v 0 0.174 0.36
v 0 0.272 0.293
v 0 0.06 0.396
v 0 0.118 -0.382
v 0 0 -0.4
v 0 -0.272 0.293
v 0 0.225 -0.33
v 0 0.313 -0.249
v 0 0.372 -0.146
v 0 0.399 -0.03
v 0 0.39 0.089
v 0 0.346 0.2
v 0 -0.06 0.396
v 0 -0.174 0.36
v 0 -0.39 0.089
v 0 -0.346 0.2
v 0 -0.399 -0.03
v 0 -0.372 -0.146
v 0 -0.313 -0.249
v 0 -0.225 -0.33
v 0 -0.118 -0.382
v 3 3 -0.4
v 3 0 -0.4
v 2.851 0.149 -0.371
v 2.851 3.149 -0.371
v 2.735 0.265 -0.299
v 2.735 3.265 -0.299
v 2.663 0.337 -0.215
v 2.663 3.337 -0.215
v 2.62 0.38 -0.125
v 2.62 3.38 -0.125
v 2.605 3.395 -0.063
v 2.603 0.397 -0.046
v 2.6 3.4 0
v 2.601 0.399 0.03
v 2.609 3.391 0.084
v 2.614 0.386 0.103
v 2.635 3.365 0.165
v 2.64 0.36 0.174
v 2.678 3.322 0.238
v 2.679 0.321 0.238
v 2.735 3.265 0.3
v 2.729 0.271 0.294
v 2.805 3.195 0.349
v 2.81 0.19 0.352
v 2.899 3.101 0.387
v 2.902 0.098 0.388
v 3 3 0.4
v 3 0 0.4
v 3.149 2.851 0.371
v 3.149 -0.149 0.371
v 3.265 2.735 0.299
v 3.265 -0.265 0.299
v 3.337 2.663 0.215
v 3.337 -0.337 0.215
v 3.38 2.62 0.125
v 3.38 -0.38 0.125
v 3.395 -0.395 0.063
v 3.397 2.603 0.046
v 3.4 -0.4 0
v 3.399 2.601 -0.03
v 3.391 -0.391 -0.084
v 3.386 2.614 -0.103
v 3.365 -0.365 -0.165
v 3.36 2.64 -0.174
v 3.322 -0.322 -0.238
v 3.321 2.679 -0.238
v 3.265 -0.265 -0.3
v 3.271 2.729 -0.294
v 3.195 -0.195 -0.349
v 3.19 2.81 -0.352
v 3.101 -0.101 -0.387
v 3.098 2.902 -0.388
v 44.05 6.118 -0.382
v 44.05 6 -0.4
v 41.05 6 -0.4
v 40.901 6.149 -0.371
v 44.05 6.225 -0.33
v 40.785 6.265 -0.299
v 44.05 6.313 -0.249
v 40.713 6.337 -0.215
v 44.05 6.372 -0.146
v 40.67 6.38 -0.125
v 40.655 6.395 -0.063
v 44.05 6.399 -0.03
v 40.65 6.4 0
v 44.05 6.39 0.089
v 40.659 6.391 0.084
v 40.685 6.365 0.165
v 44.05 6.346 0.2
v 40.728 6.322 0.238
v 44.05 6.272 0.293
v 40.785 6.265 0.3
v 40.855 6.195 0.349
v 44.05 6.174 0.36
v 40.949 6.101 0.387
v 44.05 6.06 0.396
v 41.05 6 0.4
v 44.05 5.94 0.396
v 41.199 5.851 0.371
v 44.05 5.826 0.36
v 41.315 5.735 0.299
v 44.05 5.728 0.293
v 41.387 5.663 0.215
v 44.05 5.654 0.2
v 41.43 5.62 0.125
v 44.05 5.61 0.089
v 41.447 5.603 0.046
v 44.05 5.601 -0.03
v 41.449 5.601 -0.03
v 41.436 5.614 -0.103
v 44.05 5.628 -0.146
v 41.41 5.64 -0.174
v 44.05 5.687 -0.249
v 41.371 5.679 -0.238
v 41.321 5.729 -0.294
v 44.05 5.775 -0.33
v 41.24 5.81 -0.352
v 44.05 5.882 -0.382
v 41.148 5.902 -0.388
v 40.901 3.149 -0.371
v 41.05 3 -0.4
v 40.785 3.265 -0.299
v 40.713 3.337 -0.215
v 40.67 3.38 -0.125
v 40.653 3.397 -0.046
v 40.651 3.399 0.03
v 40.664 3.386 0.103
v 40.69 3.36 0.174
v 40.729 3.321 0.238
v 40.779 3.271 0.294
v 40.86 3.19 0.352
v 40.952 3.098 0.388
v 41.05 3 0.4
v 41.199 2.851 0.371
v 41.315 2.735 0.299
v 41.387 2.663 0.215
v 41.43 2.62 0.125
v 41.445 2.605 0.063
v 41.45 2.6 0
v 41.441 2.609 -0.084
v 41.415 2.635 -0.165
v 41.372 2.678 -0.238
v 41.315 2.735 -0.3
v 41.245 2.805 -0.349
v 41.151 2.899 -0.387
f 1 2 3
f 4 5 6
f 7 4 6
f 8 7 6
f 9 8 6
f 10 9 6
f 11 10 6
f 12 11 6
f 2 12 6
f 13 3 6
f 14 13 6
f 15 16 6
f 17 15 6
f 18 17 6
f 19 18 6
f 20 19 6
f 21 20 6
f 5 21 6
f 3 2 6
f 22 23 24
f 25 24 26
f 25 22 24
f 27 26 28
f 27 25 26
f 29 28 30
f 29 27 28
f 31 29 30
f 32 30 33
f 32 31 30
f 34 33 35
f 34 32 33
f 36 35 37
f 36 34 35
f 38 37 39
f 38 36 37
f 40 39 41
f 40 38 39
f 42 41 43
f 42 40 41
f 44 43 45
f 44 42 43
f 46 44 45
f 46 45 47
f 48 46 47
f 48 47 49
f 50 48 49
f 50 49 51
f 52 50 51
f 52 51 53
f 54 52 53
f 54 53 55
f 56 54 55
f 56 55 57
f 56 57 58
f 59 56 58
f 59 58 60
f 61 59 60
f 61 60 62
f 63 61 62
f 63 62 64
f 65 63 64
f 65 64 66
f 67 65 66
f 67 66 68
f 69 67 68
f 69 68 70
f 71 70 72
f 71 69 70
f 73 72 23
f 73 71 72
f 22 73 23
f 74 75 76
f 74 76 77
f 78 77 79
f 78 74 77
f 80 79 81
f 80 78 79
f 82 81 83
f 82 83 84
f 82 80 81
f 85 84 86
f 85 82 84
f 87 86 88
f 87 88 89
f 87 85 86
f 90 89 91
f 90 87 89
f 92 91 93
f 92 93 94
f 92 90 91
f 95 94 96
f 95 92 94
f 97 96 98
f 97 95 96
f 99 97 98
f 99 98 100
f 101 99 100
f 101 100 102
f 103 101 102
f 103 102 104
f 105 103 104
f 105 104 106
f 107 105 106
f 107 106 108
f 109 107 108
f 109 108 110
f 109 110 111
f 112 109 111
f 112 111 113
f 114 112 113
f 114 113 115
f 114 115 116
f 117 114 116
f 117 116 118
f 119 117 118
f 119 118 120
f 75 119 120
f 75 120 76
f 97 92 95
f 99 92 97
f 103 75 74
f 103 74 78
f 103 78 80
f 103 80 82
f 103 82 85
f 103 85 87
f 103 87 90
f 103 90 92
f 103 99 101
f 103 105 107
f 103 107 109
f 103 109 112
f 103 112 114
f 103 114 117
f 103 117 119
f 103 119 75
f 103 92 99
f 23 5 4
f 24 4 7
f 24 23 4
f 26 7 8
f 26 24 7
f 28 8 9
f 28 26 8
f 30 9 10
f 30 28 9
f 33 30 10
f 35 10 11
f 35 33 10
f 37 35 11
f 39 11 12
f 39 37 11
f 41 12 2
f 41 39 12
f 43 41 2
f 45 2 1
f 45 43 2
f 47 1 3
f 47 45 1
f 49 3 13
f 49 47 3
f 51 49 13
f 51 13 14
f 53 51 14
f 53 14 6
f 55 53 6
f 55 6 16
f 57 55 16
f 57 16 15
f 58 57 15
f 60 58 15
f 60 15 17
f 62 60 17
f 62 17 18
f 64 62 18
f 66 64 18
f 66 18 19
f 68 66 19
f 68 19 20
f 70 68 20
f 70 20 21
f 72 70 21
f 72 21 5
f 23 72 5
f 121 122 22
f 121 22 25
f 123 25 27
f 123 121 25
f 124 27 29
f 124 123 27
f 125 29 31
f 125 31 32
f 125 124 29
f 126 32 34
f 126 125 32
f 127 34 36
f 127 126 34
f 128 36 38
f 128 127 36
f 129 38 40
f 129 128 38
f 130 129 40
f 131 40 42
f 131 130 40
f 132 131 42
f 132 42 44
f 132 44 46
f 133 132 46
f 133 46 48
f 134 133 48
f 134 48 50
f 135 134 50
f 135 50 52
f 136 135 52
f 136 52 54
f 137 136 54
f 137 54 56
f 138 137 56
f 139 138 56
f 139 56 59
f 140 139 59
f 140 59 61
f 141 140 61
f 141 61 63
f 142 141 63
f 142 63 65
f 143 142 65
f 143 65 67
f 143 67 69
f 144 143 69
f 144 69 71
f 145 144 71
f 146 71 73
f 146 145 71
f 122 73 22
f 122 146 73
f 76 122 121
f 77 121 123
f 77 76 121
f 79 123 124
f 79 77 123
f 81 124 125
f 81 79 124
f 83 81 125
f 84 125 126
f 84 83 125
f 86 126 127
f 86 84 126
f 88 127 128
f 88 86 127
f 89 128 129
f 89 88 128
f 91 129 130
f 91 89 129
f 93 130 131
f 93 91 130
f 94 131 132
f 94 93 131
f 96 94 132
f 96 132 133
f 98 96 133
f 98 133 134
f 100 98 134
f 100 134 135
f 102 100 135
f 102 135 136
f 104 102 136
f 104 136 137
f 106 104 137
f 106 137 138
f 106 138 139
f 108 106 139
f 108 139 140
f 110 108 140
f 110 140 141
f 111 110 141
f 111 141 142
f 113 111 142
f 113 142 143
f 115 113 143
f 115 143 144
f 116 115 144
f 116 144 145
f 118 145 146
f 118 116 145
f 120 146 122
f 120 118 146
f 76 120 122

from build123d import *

# Parameters (mm, degrees)
SKETCH3_R = 0.4


with BuildPart() as part:
    # Sweep1: sweep along a path in Sketch2
    with BuildLine(Plane.XY) as sweep1_path:
        Line((0, 0), (3, 0))
        Line((3, 0), (3, 3))
        Line((3, 3), (41.05, 3))
        Line((41.05, 3), (41.05, 6))
        Line((41.05, 6), (44.05, 6))
    # Sketch3 → Sweep1 (sweep)
    with BuildSketch(Plane(origin=(0, 0, 0), x_dir=(0, 0, -1), z_dir=(1, 0, 0))):
        Circle(SKETCH3_R)
    sweep(path=sweep1_path.line, transition=Transition.RIGHT)


solid = part.part
